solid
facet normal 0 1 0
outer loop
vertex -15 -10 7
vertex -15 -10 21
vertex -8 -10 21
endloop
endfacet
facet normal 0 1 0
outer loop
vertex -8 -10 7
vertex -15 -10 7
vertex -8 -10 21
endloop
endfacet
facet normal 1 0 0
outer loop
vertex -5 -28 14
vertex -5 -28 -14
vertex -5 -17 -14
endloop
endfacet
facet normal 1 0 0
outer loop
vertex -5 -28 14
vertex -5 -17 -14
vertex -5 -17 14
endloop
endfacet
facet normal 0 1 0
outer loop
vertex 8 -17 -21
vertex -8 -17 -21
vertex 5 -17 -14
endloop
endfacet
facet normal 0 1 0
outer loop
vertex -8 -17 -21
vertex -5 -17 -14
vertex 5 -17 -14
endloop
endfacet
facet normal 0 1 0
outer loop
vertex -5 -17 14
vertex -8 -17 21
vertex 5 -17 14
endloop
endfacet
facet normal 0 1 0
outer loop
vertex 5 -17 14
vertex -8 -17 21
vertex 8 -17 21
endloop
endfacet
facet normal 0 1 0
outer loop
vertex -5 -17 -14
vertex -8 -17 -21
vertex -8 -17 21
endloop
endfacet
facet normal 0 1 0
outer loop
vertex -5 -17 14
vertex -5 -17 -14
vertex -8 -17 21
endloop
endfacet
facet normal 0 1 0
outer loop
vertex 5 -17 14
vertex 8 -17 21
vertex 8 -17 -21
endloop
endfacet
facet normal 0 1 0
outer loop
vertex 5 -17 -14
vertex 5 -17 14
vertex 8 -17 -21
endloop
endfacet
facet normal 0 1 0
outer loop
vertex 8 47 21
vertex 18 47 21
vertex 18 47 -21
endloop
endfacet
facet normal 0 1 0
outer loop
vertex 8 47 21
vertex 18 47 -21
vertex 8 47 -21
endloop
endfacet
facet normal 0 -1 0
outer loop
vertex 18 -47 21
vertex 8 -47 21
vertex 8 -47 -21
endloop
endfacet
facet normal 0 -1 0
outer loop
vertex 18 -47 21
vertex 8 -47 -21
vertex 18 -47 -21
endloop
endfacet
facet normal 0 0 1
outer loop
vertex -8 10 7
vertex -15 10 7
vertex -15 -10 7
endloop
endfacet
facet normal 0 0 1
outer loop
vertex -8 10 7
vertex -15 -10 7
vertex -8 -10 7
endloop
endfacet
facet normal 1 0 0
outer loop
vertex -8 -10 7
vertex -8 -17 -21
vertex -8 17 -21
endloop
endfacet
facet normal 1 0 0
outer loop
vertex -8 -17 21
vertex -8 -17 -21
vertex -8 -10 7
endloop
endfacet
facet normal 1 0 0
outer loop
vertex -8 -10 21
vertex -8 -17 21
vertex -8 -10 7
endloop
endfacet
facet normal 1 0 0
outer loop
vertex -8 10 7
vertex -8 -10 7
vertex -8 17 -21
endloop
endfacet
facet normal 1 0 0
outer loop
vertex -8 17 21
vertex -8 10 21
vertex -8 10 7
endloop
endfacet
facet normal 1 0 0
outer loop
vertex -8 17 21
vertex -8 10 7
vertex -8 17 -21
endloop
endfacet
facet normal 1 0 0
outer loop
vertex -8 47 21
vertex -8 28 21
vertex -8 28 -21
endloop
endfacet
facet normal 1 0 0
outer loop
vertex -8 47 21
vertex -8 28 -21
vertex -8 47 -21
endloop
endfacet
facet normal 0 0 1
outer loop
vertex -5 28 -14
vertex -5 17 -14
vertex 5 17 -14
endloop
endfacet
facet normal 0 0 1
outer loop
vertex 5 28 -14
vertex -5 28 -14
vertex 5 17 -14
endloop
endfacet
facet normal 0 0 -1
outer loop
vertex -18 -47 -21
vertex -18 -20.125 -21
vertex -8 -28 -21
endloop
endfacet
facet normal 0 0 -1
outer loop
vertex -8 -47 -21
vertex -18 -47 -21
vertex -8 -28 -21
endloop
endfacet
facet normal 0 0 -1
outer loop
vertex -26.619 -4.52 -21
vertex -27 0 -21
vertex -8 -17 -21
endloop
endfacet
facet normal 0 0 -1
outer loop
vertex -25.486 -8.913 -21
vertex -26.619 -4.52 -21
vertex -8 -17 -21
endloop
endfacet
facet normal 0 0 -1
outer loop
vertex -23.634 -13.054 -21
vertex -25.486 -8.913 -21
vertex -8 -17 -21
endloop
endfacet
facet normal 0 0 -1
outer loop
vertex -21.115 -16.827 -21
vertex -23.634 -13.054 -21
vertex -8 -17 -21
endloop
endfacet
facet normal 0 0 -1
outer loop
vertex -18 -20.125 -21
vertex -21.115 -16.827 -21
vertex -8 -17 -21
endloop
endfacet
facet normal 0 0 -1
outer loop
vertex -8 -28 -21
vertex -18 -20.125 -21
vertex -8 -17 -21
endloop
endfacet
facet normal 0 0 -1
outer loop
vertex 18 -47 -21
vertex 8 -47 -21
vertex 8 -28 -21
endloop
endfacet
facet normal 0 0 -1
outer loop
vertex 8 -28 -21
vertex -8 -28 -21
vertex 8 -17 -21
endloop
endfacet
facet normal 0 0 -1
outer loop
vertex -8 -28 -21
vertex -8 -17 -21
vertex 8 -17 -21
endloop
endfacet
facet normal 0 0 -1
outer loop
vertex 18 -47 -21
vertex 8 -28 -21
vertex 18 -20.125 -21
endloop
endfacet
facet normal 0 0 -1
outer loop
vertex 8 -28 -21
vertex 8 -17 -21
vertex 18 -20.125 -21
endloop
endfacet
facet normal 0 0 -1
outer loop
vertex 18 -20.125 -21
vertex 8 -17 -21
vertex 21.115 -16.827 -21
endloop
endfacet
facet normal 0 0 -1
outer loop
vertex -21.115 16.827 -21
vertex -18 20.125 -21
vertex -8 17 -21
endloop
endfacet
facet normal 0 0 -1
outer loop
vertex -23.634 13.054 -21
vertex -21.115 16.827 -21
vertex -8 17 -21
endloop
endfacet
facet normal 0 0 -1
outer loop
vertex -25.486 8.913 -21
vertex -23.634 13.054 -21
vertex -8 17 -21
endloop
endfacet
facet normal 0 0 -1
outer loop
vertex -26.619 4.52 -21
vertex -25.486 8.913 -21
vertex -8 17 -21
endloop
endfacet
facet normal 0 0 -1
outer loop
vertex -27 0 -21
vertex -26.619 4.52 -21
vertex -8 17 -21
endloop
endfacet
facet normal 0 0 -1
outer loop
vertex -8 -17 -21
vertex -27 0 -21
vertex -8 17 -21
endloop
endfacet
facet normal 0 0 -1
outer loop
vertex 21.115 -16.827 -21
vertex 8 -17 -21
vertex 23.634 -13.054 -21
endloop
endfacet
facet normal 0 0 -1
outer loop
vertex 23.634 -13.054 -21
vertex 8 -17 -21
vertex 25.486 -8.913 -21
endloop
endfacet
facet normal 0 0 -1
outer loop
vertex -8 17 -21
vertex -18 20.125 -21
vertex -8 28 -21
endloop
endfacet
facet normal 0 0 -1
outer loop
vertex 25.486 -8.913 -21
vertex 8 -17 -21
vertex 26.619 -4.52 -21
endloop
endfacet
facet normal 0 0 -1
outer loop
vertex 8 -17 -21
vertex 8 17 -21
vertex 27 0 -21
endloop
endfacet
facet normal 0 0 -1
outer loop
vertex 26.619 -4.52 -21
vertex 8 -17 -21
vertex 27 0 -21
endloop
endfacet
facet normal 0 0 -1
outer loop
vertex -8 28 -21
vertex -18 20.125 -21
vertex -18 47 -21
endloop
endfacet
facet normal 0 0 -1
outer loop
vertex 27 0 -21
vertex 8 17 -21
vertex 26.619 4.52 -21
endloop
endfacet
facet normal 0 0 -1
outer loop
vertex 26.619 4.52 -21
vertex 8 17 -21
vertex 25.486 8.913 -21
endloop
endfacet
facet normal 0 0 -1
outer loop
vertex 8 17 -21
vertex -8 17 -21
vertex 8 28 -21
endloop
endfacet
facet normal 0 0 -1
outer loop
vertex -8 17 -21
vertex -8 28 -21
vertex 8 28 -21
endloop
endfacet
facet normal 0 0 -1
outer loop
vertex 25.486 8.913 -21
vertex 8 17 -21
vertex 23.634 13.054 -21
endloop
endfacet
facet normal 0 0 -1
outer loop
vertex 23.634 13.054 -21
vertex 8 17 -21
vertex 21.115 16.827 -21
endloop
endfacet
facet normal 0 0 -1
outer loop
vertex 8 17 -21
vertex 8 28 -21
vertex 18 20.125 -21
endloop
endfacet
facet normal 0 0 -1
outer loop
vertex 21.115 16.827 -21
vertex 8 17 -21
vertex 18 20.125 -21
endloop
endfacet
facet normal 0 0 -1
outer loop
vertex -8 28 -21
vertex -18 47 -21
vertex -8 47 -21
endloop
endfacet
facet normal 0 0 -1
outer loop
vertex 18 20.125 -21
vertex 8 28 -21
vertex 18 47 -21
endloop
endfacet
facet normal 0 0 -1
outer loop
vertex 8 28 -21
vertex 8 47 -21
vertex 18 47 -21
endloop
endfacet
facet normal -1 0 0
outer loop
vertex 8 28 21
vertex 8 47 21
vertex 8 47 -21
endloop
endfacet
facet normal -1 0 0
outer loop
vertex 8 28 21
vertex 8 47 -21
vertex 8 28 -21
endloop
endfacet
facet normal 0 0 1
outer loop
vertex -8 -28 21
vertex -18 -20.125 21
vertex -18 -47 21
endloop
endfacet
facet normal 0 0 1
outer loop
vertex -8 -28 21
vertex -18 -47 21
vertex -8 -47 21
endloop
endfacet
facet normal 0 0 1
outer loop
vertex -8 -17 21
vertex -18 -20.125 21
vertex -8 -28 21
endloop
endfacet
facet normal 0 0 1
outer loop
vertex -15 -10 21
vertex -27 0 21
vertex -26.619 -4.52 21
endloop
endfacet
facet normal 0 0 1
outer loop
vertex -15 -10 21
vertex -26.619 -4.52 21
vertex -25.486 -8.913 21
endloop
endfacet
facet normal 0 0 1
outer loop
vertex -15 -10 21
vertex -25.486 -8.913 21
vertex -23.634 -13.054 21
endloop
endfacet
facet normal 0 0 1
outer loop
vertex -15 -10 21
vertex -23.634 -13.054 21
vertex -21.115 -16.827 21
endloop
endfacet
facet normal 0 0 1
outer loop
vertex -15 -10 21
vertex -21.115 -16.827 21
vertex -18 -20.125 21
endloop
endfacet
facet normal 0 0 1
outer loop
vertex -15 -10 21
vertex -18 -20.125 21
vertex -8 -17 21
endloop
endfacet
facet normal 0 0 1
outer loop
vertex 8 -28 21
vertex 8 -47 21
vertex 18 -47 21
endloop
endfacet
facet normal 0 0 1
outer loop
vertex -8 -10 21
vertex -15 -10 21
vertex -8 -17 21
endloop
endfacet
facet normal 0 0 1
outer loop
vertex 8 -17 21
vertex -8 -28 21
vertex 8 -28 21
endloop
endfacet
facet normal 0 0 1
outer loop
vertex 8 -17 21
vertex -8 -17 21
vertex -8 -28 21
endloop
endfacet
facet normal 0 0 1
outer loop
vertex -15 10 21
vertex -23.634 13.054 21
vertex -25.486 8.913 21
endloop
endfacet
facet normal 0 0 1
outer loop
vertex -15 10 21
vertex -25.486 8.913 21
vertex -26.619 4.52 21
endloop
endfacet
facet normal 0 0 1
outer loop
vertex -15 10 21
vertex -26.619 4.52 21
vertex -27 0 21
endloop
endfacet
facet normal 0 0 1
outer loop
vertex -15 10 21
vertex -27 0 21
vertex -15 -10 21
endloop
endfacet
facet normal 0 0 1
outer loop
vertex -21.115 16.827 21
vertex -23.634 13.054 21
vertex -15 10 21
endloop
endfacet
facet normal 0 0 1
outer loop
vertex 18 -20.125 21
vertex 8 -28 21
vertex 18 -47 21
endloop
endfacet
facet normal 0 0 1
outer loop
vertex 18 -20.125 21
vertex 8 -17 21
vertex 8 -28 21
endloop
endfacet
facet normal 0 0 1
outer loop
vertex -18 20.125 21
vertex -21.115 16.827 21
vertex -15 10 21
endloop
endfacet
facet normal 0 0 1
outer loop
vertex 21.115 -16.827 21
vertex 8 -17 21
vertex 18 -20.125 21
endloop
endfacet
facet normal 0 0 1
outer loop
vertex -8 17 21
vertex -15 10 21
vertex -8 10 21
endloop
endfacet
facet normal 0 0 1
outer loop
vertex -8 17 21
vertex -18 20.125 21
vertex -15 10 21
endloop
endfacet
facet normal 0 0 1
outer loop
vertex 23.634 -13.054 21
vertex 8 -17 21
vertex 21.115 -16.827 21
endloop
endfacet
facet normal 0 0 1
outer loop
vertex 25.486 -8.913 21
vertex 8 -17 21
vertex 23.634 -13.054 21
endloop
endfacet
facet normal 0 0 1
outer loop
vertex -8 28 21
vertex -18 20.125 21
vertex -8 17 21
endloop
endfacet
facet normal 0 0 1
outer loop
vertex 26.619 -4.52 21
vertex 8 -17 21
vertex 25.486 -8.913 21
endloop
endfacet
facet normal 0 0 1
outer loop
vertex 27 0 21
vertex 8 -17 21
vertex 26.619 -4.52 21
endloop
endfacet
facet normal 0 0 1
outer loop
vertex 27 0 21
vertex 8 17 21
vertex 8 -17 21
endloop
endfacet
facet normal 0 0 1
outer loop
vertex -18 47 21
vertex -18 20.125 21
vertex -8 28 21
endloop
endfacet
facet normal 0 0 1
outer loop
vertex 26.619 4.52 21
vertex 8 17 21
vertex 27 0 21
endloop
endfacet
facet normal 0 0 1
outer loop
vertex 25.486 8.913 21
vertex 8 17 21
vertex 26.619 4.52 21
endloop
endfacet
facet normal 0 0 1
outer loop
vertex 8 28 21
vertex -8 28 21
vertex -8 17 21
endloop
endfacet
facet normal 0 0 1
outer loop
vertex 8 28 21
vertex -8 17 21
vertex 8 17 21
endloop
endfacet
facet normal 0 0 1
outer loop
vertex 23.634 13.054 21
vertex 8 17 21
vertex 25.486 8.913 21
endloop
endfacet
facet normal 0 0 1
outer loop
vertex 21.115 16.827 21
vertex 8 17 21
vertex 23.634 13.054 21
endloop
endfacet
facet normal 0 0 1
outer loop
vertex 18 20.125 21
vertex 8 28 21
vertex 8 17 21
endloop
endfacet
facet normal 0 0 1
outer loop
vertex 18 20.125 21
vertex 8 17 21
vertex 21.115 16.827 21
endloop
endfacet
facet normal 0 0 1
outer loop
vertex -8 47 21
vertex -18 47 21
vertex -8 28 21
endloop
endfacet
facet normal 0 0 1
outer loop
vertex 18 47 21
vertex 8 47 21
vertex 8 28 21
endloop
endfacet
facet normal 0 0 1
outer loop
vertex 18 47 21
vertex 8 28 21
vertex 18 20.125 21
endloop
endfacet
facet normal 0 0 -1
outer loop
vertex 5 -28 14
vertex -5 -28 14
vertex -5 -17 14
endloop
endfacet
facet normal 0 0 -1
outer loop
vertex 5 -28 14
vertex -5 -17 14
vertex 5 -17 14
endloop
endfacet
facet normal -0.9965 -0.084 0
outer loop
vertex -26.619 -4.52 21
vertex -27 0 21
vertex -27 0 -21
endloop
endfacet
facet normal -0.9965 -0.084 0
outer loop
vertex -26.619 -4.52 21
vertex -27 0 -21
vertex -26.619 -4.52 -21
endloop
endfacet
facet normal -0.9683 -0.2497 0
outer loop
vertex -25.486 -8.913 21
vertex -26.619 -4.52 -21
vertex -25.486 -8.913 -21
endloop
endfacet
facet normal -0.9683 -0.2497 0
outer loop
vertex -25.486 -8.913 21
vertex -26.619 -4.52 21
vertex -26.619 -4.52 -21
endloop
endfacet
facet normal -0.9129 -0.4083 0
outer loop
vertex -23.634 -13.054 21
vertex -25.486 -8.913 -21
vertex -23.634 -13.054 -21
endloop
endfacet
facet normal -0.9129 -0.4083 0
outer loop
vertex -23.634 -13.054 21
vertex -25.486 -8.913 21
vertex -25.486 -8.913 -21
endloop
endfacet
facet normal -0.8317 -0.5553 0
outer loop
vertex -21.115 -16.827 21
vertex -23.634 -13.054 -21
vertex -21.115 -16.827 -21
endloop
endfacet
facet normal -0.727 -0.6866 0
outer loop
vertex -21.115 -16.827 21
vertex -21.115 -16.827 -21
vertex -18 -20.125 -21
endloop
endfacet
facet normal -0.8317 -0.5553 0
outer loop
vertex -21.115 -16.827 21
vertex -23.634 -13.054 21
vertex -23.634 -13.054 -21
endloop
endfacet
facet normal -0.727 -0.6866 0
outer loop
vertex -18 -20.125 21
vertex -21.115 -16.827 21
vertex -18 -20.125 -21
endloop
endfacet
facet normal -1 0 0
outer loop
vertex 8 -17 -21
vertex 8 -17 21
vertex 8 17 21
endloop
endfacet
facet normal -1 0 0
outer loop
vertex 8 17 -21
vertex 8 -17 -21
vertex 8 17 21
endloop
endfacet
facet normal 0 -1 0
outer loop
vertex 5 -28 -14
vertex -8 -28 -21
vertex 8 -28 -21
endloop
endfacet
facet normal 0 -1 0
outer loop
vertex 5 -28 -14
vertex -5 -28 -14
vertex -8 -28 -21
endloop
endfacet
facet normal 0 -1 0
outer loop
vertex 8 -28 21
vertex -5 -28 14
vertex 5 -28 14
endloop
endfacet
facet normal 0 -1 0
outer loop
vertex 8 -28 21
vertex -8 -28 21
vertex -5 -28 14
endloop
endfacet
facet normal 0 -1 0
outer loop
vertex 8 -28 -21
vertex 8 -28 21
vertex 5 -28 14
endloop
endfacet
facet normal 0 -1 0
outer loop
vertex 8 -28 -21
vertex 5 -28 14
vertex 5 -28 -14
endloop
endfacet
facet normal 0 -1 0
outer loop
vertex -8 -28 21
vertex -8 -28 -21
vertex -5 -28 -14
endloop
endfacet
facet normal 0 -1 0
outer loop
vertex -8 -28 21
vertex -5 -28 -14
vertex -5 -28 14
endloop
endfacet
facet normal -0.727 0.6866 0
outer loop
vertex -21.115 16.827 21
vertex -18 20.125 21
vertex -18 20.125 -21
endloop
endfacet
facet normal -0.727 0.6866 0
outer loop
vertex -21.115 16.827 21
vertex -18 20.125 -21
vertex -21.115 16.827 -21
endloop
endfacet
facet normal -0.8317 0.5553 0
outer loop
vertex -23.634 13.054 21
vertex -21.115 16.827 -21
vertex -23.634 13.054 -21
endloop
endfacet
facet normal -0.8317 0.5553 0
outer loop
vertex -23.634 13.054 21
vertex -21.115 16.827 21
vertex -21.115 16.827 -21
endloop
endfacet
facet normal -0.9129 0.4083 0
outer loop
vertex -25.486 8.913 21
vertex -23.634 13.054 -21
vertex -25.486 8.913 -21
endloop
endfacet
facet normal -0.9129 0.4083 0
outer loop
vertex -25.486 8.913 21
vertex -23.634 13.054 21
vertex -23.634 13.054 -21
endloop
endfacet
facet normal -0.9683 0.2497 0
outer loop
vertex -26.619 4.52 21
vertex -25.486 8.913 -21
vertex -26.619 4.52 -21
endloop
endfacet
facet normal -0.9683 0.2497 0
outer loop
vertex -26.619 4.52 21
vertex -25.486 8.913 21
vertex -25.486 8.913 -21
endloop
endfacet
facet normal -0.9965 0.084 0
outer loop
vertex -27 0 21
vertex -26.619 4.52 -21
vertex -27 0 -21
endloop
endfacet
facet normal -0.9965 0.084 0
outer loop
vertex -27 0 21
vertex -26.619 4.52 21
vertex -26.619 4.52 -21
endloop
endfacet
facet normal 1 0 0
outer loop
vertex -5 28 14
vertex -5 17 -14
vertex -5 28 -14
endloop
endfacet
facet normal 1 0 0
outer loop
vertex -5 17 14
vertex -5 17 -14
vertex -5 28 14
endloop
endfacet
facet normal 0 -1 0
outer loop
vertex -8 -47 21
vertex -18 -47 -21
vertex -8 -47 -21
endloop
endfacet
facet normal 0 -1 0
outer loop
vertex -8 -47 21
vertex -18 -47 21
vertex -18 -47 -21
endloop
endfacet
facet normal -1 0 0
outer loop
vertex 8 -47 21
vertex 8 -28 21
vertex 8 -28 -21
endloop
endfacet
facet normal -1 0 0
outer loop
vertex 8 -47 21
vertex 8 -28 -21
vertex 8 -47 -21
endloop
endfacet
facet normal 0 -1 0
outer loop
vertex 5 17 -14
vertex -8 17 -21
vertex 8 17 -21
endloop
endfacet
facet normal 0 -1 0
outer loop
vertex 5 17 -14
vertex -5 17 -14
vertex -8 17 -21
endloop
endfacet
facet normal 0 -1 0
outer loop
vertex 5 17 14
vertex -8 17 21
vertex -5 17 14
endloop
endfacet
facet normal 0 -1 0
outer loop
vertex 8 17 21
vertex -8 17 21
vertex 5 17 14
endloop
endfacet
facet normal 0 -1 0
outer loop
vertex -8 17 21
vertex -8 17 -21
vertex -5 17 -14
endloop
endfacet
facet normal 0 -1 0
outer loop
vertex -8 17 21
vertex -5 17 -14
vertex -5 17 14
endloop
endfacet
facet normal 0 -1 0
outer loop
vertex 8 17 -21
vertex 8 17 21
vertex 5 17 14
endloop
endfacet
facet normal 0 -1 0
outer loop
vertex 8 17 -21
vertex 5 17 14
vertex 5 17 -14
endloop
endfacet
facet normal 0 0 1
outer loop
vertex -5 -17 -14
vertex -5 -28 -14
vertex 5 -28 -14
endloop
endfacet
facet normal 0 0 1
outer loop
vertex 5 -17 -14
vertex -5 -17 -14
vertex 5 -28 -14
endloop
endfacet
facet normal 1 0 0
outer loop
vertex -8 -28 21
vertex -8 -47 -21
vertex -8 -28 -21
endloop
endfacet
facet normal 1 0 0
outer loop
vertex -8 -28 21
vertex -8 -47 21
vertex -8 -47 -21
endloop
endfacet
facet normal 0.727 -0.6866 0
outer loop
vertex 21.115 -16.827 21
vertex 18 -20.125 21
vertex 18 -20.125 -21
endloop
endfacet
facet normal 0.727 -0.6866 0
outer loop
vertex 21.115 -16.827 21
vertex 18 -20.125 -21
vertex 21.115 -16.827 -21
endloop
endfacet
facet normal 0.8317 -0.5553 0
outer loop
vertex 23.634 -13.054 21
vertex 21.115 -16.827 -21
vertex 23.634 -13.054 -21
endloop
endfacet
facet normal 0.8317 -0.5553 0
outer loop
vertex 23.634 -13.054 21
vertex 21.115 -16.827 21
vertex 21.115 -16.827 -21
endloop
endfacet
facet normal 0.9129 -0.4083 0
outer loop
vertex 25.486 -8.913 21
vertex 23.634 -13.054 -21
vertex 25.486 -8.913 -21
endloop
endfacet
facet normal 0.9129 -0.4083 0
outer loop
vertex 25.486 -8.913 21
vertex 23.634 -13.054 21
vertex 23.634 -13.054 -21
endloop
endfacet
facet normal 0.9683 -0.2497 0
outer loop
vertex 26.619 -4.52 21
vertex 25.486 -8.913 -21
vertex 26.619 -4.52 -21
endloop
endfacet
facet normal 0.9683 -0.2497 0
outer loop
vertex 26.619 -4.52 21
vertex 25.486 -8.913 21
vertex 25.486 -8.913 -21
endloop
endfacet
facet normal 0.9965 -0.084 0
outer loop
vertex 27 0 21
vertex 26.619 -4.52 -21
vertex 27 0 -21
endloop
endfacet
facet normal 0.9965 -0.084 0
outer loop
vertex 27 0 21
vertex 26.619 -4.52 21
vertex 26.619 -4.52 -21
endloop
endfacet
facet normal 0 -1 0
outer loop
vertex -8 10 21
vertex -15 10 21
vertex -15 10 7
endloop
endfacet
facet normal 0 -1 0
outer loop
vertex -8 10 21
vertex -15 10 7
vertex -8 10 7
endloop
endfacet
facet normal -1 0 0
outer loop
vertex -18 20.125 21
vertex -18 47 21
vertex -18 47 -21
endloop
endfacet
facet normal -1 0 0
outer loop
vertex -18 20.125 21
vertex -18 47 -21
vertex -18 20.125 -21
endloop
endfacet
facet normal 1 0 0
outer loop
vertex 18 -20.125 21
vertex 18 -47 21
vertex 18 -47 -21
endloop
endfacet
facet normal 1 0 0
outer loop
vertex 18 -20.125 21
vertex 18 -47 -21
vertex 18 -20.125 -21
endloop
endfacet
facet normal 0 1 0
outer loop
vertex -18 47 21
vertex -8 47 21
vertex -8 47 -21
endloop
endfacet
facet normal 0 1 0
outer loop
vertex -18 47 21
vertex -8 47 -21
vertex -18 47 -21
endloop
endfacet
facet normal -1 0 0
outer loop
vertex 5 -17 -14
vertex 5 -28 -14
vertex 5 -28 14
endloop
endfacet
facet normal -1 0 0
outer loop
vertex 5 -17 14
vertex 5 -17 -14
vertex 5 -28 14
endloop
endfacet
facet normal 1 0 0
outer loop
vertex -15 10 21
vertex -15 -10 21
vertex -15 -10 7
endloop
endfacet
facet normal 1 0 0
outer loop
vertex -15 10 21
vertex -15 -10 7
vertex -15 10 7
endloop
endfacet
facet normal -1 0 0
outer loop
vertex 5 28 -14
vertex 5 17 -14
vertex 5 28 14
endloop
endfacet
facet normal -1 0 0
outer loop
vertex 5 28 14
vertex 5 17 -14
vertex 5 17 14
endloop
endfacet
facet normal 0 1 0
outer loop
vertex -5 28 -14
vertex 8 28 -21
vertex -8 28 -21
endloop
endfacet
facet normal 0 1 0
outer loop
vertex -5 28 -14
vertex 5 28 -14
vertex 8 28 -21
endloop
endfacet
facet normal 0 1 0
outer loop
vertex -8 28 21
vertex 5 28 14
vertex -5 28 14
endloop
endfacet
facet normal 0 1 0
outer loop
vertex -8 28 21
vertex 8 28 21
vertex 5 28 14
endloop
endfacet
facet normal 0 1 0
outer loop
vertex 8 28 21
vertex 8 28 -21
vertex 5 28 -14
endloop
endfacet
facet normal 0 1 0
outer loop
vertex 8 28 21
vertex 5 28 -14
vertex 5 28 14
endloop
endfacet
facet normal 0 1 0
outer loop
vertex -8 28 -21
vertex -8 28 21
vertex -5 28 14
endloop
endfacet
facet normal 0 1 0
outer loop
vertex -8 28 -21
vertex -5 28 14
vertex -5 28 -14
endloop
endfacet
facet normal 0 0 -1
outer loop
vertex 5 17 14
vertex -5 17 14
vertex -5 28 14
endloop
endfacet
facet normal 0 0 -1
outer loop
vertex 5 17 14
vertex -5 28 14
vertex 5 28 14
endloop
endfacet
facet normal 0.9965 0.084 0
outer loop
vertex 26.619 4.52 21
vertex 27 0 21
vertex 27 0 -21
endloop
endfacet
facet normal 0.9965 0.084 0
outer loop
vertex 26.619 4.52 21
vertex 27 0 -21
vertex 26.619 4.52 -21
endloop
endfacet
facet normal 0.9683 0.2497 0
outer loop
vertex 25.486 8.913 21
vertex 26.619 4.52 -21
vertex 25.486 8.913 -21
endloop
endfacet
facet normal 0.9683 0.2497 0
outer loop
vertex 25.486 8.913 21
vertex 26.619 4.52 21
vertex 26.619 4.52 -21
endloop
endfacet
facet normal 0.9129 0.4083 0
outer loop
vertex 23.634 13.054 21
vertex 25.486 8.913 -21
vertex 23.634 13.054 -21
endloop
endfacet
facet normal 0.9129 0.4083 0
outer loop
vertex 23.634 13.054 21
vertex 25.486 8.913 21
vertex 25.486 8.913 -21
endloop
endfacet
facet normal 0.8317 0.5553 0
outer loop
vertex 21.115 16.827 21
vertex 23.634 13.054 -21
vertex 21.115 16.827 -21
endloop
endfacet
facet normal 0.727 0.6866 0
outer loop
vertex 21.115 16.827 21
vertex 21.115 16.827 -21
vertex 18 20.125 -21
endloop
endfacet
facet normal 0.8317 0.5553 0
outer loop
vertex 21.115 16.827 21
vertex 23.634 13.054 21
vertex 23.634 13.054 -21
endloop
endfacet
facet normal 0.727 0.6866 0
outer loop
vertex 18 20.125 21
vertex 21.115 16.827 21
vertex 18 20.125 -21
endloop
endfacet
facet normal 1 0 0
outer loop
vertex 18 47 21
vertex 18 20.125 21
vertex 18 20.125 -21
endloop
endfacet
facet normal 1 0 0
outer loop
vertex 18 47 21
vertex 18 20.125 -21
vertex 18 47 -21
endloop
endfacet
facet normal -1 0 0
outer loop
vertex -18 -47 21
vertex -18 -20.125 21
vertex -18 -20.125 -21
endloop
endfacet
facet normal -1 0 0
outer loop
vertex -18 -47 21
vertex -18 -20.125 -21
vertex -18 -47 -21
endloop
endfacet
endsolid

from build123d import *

# Parameters (mm, degrees)
F1_DEPTH = 21
F2_W     = 10
F2_H     = 28
F3_DEPTH = 75.001
F4_W     = 16
F4_H     = 34
F5_DEPTH = 42.001
F6_W     = 7
F6_H     = 20
F7_DEPTH = 14


with BuildPart() as f1:
    # F0 (on Top) → F1 (new body, symmetric)
    with BuildSketch(Plane.XY):
        with BuildLine():
            Line((-8, -28), (0, -28))
            Line((0, -28), (8, -28))
            Line((8, -28), (8, -47))
            Line((8, -47), (18, -47))
            Line((18, -47), (18, -20.124612))
            ThreePointArc((18, -20.124612), (24.647515, -11.022704), (27, 0))
            ThreePointArc((27, 0), (24.647515, 11.022704), (18, 20.124612))
            Line((18, 20.124612), (18, 47))
            Line((18, 47), (8, 47))
            Line((8, 47), (8, 28))
            Line((8, 28), (0, 28))
            Line((0, 28), (-8, 28))
            Line((-8, 28), (-8, 47))
            Line((-8, 47), (-18, 47))
            Line((-18, 47), (-18, 20.124612))
            ThreePointArc((-18, 20.124612), (-24.647515, 11.022704), (-27, 0))
            ThreePointArc((-27, 0), (-24.647515, -11.022704), (-18, -20.124612))
            Line((-18, -20.124612), (-18, -47))
            Line((-18, -47), (-8, -47))
            Line((-8, -47), (-8, -28))
        make_face()
    extrude(amount=F1_DEPTH, both=True)

    # F2 (on face) → F3 (cut, through all)
    with BuildSketch(Plane.XZ.offset(28)):
        Rectangle(F2_W, F2_H)
    extrude(amount=-F3_DEPTH, mode=Mode.SUBTRACT)

    # F4 (on face) → F5 (cut, through all)
    with BuildSketch(Plane.XY.offset(21)):
        Rectangle(F4_W, F4_H)
    extrude(amount=-F5_DEPTH, mode=Mode.SUBTRACT)

    # F6 (on face) → F7 (cut)
    with BuildSketch(Plane.XY.offset(21)):
        with Locations((-11.5, 0)):
            Rectangle(F6_W, F6_H)
    extrude(amount=-F7_DEPTH, mode=Mode.SUBTRACT)


solid = f1.part
